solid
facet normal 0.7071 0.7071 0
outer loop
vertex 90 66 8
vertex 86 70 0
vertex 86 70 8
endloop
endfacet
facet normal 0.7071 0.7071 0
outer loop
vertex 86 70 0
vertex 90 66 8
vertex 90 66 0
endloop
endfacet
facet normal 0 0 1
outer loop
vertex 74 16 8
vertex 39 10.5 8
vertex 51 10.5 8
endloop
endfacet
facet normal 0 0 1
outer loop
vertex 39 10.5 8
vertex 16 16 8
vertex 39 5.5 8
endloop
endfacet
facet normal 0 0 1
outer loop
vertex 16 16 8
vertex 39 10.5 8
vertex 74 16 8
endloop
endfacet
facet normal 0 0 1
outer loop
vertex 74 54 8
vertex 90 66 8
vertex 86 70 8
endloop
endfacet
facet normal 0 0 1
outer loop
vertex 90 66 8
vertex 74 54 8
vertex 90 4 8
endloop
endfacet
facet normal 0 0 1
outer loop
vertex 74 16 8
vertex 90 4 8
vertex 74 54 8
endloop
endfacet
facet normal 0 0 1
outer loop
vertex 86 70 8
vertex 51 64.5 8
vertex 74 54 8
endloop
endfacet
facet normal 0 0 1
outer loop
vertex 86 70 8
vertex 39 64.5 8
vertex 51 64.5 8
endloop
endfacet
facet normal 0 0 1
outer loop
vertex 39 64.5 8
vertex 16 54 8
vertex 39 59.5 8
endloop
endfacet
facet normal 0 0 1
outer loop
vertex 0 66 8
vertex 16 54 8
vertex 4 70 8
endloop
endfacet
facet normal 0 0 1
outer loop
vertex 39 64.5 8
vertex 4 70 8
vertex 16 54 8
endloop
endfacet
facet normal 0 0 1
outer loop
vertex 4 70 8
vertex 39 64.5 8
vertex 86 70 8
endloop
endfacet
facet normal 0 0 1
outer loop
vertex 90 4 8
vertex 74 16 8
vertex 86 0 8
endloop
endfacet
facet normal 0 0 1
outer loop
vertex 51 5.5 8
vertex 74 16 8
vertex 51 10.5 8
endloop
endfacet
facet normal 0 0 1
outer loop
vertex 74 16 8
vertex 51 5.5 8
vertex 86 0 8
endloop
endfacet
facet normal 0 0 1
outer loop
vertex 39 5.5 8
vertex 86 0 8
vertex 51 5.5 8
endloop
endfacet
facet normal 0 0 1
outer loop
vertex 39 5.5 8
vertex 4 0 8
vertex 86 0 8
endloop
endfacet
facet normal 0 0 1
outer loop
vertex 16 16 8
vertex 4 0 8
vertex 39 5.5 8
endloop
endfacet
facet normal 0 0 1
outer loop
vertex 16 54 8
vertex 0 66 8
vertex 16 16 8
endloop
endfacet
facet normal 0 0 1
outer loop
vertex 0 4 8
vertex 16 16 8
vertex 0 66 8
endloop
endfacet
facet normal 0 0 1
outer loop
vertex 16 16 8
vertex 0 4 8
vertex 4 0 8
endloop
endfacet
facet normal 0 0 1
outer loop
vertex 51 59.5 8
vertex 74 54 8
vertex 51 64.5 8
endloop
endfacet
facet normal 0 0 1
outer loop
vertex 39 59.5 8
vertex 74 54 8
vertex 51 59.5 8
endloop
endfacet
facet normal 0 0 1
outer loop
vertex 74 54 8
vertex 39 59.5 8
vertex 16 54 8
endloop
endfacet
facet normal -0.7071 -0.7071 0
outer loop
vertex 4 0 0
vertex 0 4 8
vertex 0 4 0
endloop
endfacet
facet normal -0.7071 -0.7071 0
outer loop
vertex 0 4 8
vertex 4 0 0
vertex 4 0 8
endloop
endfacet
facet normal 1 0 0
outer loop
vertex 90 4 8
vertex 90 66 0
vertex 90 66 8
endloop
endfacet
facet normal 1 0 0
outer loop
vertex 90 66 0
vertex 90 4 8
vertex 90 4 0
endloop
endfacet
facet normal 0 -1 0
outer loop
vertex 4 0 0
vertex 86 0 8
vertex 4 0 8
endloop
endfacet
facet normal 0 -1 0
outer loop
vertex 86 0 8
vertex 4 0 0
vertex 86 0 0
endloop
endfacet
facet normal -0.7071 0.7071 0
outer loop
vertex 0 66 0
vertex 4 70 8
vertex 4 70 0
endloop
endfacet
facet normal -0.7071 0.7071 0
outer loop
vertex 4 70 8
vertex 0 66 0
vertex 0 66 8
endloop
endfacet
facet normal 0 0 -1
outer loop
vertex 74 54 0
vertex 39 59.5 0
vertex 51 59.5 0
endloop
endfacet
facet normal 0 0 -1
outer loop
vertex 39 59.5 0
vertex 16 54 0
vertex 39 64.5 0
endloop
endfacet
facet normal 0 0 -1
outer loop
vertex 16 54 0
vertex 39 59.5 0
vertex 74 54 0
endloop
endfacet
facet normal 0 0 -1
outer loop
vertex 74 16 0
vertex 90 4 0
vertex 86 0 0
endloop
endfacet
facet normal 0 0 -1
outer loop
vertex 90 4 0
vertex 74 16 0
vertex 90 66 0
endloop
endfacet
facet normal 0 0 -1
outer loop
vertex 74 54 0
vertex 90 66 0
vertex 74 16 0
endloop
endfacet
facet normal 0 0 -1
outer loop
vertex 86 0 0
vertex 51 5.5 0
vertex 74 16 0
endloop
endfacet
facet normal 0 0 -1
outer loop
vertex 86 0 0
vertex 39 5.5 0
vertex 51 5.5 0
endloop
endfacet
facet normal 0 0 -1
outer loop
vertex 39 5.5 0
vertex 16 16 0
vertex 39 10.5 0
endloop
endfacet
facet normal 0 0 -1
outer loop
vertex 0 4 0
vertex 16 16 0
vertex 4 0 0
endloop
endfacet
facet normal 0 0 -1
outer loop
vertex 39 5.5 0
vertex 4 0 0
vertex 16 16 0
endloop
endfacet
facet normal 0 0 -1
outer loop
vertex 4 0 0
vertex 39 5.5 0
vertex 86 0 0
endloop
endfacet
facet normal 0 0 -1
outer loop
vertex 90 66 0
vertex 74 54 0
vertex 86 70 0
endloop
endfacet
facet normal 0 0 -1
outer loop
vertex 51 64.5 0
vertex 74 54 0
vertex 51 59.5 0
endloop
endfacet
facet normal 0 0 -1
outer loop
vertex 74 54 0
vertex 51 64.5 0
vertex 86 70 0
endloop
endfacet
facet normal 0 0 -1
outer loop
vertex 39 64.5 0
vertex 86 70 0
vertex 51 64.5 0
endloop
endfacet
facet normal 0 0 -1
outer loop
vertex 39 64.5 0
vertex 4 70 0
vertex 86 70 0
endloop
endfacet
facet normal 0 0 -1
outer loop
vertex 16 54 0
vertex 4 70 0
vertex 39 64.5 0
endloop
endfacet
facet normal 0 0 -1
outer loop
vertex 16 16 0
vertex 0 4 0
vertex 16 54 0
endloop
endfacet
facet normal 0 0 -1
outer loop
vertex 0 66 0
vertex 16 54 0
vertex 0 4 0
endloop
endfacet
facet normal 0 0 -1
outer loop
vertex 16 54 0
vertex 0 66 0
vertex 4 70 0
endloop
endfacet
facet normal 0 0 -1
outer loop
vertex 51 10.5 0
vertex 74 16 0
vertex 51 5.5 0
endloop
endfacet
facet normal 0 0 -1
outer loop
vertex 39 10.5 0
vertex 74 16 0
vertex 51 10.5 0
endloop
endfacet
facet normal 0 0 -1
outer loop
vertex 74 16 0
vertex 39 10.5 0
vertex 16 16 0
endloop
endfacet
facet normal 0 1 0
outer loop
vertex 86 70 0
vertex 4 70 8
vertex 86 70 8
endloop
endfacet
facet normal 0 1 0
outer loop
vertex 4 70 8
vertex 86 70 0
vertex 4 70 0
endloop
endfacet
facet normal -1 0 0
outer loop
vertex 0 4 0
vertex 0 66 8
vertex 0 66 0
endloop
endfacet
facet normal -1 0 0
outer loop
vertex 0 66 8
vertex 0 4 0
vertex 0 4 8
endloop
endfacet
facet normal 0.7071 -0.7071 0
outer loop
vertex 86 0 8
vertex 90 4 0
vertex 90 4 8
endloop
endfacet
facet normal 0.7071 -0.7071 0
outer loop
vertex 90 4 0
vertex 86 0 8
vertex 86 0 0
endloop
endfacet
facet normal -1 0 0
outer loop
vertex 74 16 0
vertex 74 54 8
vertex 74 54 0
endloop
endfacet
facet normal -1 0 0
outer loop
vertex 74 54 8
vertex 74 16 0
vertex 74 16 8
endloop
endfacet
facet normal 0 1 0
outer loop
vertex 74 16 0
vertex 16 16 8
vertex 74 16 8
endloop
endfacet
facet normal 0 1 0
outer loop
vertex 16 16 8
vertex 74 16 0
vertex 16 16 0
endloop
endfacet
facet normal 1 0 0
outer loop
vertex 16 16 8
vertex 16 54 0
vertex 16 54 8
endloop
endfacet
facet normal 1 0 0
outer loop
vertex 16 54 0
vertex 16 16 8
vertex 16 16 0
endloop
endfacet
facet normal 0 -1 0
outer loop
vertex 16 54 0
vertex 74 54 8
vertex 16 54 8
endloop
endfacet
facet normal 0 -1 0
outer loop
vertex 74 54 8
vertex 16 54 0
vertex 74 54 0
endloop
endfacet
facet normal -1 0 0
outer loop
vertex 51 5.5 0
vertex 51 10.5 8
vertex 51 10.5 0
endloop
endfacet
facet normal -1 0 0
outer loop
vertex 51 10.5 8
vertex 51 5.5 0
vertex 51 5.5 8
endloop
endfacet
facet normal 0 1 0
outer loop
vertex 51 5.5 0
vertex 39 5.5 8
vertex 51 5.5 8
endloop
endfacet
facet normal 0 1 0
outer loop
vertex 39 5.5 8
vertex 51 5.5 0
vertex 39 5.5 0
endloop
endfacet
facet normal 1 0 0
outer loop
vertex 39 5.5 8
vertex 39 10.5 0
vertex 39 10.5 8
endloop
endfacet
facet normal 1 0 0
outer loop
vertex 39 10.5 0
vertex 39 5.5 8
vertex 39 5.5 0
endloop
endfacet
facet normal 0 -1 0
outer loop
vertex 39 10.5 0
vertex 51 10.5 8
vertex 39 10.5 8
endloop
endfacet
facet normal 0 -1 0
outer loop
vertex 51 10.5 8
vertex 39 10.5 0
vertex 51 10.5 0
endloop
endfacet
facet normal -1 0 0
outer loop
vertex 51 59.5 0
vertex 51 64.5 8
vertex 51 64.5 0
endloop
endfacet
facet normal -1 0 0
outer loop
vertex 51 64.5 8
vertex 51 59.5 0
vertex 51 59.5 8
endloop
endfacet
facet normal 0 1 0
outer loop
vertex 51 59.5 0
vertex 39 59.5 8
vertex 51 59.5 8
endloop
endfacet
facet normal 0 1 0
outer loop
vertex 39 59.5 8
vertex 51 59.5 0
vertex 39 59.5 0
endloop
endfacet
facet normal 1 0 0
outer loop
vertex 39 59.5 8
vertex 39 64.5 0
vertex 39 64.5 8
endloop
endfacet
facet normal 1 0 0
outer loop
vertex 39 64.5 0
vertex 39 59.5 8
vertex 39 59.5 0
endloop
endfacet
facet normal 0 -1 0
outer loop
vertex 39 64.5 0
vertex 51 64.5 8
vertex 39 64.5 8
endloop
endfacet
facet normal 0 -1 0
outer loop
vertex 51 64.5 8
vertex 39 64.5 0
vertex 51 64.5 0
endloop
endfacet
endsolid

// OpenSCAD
$fn = 32;

// ----------------------------------------------------------------------
// Frame plate: 90 x 70 frame, 16 mm rails
// ----------------------------------------------------------------------

// --- parameters (mm) ---
plate_l = 90;             // plate length, X
plate_w = 70;             // plate width, Y
plate_t = 8;              // plate thickness, Z (extrusion height)
corner_c = 4;             // corner chamfer
frame_bar = 16;           // frame rail width
slot_l = 12;              // adjustment slot length
slot_w = 5;               // adjustment slot width

win_l = plate_l - 2 * frame_bar;  // window length
win_w = plate_w - 2 * frame_bar;  // window width

profile = [[4, 0], [86, 0], [90, 4], [90, 66], [86, 70], [4, 70], [0, 66], [0, 4]];  // primary outline, 8 points, counter clockwise
void_1 = [[16, 16], [74, 16], [74, 54], [16, 54]];  // the window, 4 points
void_2 = [[39, 5.5], [51, 5.5], [51, 10.5], [39, 10.5]];  // adjustment slot, 4 points
void_3 = [[39, 59.5], [51, 59.5], [51, 64.5], [39, 64.5]];  // adjustment slot, 4 points

// --- the one profile operation ---
difference() {
  linear_extrude(height = plate_t) polygon(points = profile);
  translate([0, 0, -1])
    linear_extrude(height = plate_t + 2) polygon(points = void_1);
  translate([0, 0, -1])
    linear_extrude(height = plate_t + 2) polygon(points = void_2);
  translate([0, 0, -1])
    linear_extrude(height = plate_t + 2) polygon(points = void_3);
}
